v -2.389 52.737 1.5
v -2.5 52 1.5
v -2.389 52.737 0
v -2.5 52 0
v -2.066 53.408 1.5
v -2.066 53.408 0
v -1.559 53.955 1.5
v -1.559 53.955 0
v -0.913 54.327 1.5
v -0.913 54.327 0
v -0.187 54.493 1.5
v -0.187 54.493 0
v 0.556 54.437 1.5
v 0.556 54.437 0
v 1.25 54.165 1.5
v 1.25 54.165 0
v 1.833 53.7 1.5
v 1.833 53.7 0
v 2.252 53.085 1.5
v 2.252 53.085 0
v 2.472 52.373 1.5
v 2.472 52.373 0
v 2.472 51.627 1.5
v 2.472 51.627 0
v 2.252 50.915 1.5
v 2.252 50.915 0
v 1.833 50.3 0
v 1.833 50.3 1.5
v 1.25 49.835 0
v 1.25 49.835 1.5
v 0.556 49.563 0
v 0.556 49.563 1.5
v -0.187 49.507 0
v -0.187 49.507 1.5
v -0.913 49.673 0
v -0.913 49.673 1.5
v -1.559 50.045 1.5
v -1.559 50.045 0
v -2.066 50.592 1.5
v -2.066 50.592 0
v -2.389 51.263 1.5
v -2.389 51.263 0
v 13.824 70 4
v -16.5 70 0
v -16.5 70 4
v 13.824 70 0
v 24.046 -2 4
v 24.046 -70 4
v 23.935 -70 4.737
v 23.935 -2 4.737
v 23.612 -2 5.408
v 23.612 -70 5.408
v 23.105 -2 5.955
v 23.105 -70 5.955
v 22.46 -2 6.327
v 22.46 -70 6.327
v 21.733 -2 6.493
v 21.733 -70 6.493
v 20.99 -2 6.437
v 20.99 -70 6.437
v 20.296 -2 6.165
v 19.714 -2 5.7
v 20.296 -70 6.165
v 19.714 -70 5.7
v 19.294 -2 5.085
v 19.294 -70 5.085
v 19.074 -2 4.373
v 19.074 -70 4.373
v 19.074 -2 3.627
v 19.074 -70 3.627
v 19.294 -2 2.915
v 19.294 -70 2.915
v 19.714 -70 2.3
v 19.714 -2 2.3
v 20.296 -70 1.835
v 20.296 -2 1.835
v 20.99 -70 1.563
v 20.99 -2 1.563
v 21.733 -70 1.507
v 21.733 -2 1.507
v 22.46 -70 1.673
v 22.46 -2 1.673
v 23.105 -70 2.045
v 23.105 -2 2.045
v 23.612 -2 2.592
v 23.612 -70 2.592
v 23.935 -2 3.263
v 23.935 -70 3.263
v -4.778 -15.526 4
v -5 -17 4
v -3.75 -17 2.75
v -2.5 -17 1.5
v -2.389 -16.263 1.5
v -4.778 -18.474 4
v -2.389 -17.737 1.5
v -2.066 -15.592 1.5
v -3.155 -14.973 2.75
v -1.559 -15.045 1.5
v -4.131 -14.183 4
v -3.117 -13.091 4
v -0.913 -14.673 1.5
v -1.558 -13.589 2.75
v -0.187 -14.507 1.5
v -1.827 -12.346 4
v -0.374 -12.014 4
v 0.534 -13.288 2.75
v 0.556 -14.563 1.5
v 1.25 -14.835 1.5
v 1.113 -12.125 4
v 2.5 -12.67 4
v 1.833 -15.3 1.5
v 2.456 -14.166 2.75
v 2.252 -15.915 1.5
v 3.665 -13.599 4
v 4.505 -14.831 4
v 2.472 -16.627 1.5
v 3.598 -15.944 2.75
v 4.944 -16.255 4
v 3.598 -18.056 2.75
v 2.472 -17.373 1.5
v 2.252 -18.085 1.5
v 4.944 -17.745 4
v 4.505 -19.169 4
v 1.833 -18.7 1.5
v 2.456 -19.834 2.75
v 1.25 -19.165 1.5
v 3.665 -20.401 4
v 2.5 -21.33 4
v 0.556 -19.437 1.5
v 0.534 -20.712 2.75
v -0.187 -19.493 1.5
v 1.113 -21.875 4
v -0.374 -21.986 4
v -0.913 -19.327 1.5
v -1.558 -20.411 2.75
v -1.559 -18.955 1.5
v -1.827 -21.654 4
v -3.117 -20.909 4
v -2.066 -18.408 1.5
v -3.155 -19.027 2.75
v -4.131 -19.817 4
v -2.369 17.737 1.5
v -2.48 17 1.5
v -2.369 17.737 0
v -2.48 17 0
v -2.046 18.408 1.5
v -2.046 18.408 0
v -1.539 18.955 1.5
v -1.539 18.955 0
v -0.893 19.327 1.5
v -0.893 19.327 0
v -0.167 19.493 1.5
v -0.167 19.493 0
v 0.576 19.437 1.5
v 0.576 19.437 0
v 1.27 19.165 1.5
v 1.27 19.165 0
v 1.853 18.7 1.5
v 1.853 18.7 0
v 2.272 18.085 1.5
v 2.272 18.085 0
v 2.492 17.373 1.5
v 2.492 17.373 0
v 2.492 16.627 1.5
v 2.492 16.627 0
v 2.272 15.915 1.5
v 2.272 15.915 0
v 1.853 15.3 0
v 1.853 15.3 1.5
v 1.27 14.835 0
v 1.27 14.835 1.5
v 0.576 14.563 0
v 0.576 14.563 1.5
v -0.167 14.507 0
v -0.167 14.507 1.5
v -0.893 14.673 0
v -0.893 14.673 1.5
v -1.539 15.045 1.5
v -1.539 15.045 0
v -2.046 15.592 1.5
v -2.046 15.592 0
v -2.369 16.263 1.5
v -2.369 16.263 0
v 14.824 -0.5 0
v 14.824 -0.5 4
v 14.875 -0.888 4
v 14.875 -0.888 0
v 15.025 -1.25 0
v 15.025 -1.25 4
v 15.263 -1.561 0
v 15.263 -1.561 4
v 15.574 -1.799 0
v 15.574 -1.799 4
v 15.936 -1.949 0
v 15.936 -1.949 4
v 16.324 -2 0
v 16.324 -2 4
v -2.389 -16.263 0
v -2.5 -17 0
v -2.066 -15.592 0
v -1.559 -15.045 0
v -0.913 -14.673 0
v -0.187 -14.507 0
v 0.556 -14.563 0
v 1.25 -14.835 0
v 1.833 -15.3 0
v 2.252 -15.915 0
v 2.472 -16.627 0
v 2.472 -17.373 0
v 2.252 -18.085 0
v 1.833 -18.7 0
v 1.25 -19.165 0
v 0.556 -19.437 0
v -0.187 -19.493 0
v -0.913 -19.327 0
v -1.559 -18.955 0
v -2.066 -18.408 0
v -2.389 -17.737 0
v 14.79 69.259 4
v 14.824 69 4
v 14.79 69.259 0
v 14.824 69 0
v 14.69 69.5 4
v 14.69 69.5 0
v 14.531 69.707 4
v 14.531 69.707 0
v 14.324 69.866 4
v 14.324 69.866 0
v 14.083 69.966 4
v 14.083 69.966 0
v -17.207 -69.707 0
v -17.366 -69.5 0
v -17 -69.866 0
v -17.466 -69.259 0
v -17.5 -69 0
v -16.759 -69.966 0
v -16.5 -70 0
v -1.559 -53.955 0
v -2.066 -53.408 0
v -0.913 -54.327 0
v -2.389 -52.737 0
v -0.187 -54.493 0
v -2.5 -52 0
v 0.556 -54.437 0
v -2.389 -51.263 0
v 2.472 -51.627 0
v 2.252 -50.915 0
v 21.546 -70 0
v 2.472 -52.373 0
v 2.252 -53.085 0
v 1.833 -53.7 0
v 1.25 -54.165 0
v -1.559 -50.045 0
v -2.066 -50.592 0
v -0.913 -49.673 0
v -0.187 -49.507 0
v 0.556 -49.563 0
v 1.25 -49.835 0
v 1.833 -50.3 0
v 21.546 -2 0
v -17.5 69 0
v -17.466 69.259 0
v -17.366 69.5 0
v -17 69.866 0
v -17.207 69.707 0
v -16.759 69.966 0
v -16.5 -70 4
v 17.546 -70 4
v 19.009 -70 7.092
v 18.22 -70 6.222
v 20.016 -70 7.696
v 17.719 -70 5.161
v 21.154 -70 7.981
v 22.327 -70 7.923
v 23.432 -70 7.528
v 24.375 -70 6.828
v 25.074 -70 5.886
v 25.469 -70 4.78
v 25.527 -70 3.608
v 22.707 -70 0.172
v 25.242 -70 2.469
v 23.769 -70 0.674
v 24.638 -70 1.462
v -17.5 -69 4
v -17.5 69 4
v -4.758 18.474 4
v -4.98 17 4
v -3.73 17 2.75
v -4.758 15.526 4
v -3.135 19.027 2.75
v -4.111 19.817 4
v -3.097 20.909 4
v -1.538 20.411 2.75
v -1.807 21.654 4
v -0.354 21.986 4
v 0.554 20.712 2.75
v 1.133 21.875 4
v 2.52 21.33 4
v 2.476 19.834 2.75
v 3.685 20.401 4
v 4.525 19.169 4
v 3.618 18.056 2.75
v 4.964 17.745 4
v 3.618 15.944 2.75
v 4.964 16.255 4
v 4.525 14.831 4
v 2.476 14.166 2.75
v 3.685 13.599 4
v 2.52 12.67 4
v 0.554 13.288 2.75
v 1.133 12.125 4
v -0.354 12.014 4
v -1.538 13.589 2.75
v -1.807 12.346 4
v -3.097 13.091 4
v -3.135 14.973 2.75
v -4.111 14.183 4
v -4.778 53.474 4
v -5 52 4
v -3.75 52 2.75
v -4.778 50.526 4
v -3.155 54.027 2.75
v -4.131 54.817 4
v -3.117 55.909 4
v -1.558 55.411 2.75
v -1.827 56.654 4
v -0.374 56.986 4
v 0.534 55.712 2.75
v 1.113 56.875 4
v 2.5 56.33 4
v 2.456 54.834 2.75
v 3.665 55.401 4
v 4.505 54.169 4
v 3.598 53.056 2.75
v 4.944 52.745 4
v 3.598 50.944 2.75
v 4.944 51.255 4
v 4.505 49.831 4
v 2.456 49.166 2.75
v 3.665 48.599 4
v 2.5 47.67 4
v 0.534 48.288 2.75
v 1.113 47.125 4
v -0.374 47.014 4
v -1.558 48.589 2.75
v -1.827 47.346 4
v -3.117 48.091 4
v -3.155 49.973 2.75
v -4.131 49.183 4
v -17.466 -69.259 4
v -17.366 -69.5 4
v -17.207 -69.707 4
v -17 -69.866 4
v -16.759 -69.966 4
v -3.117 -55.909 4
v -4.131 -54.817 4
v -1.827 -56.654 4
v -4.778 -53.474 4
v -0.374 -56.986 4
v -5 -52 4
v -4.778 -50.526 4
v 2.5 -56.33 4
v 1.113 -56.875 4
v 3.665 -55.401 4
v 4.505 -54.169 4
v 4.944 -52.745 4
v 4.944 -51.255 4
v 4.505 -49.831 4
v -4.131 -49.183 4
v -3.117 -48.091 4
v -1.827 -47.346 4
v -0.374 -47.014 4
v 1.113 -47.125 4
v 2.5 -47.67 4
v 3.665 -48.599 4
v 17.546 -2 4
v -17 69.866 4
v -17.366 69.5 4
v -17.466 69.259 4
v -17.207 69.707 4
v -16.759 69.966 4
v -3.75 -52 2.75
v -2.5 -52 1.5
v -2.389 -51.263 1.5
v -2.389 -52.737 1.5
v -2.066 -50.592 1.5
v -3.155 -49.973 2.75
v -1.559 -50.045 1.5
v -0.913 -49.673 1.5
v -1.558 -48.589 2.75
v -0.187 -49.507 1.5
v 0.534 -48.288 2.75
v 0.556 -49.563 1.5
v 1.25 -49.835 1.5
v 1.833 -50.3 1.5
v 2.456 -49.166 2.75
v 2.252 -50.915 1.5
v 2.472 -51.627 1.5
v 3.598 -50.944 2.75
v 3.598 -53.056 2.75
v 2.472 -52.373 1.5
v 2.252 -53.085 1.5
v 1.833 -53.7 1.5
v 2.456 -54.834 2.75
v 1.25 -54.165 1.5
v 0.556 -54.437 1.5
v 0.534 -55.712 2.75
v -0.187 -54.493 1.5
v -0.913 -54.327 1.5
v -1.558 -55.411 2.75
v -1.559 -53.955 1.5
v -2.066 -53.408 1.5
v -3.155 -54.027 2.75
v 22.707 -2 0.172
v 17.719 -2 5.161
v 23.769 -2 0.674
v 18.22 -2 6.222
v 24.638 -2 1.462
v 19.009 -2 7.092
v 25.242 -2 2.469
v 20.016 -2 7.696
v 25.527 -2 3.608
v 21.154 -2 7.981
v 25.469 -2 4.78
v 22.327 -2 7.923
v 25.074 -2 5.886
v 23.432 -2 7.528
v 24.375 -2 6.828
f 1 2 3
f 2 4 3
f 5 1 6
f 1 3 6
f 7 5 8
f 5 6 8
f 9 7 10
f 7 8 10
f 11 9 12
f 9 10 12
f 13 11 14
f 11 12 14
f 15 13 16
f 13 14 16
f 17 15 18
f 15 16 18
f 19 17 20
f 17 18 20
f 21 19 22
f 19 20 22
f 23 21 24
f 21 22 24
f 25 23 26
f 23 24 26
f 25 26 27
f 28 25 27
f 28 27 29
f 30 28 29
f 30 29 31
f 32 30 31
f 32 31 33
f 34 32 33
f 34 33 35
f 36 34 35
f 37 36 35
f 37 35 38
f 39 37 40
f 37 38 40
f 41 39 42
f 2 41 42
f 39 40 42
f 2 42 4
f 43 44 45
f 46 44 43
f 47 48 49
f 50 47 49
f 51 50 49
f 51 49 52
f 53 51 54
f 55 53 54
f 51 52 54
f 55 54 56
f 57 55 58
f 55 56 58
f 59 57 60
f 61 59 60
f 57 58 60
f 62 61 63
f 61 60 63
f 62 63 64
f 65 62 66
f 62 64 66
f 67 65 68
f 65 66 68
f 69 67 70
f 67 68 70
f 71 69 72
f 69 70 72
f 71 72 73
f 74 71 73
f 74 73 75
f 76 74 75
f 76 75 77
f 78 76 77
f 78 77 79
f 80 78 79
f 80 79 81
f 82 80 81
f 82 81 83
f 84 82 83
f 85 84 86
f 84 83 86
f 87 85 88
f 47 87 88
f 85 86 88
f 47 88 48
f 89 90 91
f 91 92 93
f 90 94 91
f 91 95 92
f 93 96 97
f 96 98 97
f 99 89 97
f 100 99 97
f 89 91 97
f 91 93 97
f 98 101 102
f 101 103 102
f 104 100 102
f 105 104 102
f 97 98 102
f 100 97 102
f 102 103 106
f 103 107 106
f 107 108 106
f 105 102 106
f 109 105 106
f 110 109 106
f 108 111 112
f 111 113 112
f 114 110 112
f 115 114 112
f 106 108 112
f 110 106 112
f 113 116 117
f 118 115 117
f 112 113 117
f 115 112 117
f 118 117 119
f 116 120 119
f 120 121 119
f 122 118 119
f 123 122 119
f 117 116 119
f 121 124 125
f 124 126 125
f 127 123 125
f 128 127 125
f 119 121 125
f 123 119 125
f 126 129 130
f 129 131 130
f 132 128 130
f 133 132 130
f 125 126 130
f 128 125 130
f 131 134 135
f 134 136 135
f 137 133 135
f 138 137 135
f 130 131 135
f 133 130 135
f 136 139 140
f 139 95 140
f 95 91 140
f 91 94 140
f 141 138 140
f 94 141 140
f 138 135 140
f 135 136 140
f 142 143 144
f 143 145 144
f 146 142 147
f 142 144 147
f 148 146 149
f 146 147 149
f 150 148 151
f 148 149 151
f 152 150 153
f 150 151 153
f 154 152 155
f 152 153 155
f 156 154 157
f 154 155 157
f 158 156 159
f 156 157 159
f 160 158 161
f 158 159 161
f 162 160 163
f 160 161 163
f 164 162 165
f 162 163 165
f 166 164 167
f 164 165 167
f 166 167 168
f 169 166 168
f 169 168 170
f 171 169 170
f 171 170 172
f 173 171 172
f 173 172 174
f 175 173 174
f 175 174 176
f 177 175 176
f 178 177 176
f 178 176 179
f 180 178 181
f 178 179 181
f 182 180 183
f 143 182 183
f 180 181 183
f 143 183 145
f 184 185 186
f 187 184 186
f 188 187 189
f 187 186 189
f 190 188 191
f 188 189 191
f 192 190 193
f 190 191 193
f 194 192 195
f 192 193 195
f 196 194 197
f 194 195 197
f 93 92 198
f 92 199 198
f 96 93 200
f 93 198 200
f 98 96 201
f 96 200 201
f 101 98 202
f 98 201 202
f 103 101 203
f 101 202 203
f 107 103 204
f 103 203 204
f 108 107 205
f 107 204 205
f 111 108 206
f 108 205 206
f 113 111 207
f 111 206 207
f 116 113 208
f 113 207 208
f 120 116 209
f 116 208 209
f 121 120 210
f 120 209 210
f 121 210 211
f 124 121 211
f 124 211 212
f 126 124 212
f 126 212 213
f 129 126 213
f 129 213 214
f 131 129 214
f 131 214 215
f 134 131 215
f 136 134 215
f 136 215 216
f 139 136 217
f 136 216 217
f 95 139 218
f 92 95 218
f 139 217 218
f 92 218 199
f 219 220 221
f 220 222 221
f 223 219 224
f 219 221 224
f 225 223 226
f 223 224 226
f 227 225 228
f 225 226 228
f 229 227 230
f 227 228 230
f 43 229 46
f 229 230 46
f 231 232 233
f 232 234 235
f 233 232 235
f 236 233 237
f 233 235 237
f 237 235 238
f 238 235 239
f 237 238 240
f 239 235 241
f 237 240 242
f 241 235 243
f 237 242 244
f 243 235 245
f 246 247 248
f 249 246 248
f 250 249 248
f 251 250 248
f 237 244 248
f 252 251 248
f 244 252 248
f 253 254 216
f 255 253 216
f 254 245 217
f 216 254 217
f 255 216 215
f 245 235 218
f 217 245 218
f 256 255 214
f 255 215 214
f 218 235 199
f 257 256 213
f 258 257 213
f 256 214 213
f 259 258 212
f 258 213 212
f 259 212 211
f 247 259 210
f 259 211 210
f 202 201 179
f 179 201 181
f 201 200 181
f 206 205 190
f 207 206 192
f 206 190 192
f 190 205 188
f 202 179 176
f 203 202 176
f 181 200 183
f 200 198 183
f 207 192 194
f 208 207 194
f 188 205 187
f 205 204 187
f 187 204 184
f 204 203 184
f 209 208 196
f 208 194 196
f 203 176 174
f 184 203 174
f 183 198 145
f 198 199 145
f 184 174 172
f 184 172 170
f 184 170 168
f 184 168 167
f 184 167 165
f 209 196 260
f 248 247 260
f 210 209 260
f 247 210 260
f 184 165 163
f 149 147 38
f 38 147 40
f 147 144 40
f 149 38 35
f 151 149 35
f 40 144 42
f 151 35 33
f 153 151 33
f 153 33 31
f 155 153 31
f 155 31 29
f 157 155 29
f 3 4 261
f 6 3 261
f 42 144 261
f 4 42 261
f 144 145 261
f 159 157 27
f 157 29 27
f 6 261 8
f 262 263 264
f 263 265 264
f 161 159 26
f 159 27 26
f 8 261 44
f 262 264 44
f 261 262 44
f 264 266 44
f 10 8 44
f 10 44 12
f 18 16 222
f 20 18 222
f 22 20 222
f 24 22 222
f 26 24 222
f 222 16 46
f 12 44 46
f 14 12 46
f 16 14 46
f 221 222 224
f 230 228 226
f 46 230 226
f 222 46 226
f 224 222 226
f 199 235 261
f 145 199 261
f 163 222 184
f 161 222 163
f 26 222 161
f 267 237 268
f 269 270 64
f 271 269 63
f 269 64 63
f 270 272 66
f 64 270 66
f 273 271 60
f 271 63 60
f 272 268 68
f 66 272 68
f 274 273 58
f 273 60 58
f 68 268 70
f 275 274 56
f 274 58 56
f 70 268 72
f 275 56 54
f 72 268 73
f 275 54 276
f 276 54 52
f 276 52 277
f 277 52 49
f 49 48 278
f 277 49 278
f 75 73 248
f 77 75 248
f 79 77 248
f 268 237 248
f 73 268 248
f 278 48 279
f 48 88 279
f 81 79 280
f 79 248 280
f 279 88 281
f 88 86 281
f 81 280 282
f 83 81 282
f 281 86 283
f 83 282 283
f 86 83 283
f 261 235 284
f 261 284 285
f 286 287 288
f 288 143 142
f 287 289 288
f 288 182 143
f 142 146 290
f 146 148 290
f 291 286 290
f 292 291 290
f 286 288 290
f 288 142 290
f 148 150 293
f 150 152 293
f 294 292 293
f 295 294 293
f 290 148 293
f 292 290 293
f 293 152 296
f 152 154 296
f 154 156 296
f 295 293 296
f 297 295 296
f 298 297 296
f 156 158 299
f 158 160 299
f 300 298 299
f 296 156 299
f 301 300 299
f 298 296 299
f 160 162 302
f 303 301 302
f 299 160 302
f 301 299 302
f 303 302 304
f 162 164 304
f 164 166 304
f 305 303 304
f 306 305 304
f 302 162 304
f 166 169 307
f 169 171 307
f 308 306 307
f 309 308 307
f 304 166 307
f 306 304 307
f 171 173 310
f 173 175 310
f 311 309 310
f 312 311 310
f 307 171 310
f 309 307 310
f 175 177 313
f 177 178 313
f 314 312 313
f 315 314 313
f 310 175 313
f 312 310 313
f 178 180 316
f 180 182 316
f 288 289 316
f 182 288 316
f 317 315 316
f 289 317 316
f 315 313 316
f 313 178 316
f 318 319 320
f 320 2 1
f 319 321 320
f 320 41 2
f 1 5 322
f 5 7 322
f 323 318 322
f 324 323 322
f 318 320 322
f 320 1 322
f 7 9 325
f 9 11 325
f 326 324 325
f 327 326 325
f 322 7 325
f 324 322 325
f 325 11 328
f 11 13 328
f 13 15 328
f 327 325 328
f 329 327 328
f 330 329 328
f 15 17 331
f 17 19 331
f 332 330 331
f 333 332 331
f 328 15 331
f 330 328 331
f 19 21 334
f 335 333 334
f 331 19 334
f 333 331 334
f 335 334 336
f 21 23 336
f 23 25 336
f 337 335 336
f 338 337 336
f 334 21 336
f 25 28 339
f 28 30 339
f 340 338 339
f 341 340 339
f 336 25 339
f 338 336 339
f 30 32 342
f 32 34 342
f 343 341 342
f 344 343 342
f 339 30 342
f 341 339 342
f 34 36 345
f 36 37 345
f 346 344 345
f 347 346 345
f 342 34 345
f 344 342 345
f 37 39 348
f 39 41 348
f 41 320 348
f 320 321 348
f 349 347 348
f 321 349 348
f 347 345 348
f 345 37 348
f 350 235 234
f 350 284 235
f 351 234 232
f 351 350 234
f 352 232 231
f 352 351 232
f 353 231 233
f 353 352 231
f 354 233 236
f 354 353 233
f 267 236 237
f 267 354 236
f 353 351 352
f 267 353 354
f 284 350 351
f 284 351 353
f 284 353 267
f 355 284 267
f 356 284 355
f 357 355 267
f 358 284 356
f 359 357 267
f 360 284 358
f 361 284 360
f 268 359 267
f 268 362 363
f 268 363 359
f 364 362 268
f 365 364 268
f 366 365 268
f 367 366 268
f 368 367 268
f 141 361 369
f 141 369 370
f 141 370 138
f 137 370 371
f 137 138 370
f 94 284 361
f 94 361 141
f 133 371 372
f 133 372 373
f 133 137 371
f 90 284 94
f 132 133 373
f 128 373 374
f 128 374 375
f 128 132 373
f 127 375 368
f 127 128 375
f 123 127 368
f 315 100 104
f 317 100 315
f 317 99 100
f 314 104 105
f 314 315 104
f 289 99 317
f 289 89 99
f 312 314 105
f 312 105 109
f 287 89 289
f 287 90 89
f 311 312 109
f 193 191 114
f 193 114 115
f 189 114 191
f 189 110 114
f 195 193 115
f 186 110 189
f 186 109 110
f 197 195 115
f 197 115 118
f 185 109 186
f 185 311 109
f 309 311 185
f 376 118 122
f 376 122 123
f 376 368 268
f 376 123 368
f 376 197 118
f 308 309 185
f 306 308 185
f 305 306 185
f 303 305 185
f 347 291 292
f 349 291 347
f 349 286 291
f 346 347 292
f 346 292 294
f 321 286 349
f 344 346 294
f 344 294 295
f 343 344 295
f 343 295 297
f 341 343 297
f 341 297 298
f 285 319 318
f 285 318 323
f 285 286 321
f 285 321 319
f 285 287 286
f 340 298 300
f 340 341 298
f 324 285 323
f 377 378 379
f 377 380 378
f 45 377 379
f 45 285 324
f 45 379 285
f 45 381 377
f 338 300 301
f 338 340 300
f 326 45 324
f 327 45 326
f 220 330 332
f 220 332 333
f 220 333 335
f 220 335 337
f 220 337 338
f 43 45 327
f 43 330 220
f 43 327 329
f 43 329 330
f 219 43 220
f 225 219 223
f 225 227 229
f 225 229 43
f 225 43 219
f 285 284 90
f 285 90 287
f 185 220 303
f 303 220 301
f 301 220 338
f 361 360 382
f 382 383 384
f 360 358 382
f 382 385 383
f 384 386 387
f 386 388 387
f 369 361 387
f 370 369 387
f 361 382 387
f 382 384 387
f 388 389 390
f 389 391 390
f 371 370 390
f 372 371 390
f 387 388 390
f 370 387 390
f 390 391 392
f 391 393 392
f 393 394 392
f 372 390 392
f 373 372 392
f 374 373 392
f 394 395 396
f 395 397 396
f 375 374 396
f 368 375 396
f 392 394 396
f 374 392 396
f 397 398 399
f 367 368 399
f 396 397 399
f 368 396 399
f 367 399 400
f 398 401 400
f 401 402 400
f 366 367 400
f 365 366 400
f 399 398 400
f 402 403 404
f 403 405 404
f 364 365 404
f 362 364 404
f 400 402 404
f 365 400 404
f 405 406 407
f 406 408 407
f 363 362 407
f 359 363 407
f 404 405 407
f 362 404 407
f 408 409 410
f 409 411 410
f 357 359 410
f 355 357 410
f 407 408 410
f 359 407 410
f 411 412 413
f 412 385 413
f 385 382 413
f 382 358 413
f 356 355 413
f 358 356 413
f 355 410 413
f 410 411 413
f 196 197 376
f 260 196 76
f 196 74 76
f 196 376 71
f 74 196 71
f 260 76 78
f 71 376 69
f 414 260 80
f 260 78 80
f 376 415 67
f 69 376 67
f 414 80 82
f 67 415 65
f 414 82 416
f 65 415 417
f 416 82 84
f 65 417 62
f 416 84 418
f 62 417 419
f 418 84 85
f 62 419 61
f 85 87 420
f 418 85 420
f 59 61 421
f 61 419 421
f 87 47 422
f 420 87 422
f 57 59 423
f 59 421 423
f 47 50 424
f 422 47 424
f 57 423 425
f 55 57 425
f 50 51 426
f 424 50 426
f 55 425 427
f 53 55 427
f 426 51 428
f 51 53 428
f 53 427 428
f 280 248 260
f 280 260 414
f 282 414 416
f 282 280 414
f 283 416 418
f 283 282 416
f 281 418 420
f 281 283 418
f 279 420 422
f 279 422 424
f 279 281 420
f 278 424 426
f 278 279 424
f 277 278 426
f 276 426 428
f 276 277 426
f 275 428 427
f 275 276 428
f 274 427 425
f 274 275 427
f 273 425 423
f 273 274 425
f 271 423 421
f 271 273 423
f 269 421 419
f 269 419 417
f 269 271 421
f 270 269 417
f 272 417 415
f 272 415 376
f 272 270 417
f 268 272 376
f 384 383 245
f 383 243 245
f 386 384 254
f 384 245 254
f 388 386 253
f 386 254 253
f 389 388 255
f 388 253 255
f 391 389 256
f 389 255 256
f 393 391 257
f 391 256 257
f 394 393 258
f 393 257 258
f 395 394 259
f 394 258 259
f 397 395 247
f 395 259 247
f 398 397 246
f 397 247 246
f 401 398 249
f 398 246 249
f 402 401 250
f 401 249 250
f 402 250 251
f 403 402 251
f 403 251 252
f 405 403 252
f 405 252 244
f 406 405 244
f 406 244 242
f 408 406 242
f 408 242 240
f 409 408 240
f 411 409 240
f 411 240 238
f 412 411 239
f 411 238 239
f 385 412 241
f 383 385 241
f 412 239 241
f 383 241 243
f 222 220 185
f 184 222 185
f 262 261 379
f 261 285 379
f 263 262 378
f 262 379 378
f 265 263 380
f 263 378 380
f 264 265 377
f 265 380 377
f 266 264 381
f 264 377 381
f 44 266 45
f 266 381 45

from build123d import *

# Parameters (mm, degrees)
F0_W           = 35
F0_H           = 140
F1_DEPTH       = 4
F2_R           = 2.5
F3_DEPTH       = 68
F6_D           = 5
F6_CSINK_D     = 10
F6_CSINK_ANGLE = 90
F8_DEPTH       = 4.001
F9_R           = 1


with BuildPart() as f1:
    # F0 (on Top) → F1 (new body)
    with BuildSketch(Plane.XY):
        Rectangle(F0_W, F0_H)
    extrude(amount=F1_DEPTH)


with BuildPart() as f3:
    # F2 (on face) → F3 (new body)
    with BuildSketch(Plane.XZ.offset(70)):
        with BuildLine():
            Line((17.5, 4), (17.5, 0))
            Line((17.5, 0), (21.546269994, 0))
            ThreePointArc((21.546269994, 0), (24.3746971188, 6.8284271247), (17.546269994, 4))
            Line((17.546269994, 4), (17.5, 4))
        make_face()
        with Locations((21.546269994, 4)):
            Circle(F2_R, mode=Mode.SUBTRACT)
    extrude(amount=-F3_DEPTH)

    # F4: union F1
    add(f1.part)

    # F6 (through all)
    with Locations(Plane.XY.offset(4)):
        with Locations((0, -52), (0, -17), (0.0200391446, 17), (0, 52)):
            CounterSinkHole(F6_D / 2, F6_CSINK_D / 2, counter_sink_angle=F6_CSINK_ANGLE)

    # F7 (on face) → F8 (cut, through all)
    with BuildSketch(Plane.XY.offset(4)):
        with BuildLine():
            Line((17.5, 70), (14.8238670081, 70))
            Line((14.8238670081, 70), (14.8238670081, -0.5))
            ThreePointArc((14.8238670081, -0.5), (15.2632068363, -1.5606601718), (16.3238670081, -2))
            Line((16.3238670081, -2), (17.5, -2))
            Line((17.5, -2), (17.5, 70))
        make_face()
    extrude(amount=-F8_DEPTH, mode=Mode.SUBTRACT)

    # F9
    f9_edges = [f3.edges().sort_by_distance(p)[0] for p in [
        (-17.5, -70, 2),
        (-17.5, 70, 2),
        (14.823867, 70, 2),
    ]]
    fillet(f9_edges, radius=F9_R)


solid = f3.part
